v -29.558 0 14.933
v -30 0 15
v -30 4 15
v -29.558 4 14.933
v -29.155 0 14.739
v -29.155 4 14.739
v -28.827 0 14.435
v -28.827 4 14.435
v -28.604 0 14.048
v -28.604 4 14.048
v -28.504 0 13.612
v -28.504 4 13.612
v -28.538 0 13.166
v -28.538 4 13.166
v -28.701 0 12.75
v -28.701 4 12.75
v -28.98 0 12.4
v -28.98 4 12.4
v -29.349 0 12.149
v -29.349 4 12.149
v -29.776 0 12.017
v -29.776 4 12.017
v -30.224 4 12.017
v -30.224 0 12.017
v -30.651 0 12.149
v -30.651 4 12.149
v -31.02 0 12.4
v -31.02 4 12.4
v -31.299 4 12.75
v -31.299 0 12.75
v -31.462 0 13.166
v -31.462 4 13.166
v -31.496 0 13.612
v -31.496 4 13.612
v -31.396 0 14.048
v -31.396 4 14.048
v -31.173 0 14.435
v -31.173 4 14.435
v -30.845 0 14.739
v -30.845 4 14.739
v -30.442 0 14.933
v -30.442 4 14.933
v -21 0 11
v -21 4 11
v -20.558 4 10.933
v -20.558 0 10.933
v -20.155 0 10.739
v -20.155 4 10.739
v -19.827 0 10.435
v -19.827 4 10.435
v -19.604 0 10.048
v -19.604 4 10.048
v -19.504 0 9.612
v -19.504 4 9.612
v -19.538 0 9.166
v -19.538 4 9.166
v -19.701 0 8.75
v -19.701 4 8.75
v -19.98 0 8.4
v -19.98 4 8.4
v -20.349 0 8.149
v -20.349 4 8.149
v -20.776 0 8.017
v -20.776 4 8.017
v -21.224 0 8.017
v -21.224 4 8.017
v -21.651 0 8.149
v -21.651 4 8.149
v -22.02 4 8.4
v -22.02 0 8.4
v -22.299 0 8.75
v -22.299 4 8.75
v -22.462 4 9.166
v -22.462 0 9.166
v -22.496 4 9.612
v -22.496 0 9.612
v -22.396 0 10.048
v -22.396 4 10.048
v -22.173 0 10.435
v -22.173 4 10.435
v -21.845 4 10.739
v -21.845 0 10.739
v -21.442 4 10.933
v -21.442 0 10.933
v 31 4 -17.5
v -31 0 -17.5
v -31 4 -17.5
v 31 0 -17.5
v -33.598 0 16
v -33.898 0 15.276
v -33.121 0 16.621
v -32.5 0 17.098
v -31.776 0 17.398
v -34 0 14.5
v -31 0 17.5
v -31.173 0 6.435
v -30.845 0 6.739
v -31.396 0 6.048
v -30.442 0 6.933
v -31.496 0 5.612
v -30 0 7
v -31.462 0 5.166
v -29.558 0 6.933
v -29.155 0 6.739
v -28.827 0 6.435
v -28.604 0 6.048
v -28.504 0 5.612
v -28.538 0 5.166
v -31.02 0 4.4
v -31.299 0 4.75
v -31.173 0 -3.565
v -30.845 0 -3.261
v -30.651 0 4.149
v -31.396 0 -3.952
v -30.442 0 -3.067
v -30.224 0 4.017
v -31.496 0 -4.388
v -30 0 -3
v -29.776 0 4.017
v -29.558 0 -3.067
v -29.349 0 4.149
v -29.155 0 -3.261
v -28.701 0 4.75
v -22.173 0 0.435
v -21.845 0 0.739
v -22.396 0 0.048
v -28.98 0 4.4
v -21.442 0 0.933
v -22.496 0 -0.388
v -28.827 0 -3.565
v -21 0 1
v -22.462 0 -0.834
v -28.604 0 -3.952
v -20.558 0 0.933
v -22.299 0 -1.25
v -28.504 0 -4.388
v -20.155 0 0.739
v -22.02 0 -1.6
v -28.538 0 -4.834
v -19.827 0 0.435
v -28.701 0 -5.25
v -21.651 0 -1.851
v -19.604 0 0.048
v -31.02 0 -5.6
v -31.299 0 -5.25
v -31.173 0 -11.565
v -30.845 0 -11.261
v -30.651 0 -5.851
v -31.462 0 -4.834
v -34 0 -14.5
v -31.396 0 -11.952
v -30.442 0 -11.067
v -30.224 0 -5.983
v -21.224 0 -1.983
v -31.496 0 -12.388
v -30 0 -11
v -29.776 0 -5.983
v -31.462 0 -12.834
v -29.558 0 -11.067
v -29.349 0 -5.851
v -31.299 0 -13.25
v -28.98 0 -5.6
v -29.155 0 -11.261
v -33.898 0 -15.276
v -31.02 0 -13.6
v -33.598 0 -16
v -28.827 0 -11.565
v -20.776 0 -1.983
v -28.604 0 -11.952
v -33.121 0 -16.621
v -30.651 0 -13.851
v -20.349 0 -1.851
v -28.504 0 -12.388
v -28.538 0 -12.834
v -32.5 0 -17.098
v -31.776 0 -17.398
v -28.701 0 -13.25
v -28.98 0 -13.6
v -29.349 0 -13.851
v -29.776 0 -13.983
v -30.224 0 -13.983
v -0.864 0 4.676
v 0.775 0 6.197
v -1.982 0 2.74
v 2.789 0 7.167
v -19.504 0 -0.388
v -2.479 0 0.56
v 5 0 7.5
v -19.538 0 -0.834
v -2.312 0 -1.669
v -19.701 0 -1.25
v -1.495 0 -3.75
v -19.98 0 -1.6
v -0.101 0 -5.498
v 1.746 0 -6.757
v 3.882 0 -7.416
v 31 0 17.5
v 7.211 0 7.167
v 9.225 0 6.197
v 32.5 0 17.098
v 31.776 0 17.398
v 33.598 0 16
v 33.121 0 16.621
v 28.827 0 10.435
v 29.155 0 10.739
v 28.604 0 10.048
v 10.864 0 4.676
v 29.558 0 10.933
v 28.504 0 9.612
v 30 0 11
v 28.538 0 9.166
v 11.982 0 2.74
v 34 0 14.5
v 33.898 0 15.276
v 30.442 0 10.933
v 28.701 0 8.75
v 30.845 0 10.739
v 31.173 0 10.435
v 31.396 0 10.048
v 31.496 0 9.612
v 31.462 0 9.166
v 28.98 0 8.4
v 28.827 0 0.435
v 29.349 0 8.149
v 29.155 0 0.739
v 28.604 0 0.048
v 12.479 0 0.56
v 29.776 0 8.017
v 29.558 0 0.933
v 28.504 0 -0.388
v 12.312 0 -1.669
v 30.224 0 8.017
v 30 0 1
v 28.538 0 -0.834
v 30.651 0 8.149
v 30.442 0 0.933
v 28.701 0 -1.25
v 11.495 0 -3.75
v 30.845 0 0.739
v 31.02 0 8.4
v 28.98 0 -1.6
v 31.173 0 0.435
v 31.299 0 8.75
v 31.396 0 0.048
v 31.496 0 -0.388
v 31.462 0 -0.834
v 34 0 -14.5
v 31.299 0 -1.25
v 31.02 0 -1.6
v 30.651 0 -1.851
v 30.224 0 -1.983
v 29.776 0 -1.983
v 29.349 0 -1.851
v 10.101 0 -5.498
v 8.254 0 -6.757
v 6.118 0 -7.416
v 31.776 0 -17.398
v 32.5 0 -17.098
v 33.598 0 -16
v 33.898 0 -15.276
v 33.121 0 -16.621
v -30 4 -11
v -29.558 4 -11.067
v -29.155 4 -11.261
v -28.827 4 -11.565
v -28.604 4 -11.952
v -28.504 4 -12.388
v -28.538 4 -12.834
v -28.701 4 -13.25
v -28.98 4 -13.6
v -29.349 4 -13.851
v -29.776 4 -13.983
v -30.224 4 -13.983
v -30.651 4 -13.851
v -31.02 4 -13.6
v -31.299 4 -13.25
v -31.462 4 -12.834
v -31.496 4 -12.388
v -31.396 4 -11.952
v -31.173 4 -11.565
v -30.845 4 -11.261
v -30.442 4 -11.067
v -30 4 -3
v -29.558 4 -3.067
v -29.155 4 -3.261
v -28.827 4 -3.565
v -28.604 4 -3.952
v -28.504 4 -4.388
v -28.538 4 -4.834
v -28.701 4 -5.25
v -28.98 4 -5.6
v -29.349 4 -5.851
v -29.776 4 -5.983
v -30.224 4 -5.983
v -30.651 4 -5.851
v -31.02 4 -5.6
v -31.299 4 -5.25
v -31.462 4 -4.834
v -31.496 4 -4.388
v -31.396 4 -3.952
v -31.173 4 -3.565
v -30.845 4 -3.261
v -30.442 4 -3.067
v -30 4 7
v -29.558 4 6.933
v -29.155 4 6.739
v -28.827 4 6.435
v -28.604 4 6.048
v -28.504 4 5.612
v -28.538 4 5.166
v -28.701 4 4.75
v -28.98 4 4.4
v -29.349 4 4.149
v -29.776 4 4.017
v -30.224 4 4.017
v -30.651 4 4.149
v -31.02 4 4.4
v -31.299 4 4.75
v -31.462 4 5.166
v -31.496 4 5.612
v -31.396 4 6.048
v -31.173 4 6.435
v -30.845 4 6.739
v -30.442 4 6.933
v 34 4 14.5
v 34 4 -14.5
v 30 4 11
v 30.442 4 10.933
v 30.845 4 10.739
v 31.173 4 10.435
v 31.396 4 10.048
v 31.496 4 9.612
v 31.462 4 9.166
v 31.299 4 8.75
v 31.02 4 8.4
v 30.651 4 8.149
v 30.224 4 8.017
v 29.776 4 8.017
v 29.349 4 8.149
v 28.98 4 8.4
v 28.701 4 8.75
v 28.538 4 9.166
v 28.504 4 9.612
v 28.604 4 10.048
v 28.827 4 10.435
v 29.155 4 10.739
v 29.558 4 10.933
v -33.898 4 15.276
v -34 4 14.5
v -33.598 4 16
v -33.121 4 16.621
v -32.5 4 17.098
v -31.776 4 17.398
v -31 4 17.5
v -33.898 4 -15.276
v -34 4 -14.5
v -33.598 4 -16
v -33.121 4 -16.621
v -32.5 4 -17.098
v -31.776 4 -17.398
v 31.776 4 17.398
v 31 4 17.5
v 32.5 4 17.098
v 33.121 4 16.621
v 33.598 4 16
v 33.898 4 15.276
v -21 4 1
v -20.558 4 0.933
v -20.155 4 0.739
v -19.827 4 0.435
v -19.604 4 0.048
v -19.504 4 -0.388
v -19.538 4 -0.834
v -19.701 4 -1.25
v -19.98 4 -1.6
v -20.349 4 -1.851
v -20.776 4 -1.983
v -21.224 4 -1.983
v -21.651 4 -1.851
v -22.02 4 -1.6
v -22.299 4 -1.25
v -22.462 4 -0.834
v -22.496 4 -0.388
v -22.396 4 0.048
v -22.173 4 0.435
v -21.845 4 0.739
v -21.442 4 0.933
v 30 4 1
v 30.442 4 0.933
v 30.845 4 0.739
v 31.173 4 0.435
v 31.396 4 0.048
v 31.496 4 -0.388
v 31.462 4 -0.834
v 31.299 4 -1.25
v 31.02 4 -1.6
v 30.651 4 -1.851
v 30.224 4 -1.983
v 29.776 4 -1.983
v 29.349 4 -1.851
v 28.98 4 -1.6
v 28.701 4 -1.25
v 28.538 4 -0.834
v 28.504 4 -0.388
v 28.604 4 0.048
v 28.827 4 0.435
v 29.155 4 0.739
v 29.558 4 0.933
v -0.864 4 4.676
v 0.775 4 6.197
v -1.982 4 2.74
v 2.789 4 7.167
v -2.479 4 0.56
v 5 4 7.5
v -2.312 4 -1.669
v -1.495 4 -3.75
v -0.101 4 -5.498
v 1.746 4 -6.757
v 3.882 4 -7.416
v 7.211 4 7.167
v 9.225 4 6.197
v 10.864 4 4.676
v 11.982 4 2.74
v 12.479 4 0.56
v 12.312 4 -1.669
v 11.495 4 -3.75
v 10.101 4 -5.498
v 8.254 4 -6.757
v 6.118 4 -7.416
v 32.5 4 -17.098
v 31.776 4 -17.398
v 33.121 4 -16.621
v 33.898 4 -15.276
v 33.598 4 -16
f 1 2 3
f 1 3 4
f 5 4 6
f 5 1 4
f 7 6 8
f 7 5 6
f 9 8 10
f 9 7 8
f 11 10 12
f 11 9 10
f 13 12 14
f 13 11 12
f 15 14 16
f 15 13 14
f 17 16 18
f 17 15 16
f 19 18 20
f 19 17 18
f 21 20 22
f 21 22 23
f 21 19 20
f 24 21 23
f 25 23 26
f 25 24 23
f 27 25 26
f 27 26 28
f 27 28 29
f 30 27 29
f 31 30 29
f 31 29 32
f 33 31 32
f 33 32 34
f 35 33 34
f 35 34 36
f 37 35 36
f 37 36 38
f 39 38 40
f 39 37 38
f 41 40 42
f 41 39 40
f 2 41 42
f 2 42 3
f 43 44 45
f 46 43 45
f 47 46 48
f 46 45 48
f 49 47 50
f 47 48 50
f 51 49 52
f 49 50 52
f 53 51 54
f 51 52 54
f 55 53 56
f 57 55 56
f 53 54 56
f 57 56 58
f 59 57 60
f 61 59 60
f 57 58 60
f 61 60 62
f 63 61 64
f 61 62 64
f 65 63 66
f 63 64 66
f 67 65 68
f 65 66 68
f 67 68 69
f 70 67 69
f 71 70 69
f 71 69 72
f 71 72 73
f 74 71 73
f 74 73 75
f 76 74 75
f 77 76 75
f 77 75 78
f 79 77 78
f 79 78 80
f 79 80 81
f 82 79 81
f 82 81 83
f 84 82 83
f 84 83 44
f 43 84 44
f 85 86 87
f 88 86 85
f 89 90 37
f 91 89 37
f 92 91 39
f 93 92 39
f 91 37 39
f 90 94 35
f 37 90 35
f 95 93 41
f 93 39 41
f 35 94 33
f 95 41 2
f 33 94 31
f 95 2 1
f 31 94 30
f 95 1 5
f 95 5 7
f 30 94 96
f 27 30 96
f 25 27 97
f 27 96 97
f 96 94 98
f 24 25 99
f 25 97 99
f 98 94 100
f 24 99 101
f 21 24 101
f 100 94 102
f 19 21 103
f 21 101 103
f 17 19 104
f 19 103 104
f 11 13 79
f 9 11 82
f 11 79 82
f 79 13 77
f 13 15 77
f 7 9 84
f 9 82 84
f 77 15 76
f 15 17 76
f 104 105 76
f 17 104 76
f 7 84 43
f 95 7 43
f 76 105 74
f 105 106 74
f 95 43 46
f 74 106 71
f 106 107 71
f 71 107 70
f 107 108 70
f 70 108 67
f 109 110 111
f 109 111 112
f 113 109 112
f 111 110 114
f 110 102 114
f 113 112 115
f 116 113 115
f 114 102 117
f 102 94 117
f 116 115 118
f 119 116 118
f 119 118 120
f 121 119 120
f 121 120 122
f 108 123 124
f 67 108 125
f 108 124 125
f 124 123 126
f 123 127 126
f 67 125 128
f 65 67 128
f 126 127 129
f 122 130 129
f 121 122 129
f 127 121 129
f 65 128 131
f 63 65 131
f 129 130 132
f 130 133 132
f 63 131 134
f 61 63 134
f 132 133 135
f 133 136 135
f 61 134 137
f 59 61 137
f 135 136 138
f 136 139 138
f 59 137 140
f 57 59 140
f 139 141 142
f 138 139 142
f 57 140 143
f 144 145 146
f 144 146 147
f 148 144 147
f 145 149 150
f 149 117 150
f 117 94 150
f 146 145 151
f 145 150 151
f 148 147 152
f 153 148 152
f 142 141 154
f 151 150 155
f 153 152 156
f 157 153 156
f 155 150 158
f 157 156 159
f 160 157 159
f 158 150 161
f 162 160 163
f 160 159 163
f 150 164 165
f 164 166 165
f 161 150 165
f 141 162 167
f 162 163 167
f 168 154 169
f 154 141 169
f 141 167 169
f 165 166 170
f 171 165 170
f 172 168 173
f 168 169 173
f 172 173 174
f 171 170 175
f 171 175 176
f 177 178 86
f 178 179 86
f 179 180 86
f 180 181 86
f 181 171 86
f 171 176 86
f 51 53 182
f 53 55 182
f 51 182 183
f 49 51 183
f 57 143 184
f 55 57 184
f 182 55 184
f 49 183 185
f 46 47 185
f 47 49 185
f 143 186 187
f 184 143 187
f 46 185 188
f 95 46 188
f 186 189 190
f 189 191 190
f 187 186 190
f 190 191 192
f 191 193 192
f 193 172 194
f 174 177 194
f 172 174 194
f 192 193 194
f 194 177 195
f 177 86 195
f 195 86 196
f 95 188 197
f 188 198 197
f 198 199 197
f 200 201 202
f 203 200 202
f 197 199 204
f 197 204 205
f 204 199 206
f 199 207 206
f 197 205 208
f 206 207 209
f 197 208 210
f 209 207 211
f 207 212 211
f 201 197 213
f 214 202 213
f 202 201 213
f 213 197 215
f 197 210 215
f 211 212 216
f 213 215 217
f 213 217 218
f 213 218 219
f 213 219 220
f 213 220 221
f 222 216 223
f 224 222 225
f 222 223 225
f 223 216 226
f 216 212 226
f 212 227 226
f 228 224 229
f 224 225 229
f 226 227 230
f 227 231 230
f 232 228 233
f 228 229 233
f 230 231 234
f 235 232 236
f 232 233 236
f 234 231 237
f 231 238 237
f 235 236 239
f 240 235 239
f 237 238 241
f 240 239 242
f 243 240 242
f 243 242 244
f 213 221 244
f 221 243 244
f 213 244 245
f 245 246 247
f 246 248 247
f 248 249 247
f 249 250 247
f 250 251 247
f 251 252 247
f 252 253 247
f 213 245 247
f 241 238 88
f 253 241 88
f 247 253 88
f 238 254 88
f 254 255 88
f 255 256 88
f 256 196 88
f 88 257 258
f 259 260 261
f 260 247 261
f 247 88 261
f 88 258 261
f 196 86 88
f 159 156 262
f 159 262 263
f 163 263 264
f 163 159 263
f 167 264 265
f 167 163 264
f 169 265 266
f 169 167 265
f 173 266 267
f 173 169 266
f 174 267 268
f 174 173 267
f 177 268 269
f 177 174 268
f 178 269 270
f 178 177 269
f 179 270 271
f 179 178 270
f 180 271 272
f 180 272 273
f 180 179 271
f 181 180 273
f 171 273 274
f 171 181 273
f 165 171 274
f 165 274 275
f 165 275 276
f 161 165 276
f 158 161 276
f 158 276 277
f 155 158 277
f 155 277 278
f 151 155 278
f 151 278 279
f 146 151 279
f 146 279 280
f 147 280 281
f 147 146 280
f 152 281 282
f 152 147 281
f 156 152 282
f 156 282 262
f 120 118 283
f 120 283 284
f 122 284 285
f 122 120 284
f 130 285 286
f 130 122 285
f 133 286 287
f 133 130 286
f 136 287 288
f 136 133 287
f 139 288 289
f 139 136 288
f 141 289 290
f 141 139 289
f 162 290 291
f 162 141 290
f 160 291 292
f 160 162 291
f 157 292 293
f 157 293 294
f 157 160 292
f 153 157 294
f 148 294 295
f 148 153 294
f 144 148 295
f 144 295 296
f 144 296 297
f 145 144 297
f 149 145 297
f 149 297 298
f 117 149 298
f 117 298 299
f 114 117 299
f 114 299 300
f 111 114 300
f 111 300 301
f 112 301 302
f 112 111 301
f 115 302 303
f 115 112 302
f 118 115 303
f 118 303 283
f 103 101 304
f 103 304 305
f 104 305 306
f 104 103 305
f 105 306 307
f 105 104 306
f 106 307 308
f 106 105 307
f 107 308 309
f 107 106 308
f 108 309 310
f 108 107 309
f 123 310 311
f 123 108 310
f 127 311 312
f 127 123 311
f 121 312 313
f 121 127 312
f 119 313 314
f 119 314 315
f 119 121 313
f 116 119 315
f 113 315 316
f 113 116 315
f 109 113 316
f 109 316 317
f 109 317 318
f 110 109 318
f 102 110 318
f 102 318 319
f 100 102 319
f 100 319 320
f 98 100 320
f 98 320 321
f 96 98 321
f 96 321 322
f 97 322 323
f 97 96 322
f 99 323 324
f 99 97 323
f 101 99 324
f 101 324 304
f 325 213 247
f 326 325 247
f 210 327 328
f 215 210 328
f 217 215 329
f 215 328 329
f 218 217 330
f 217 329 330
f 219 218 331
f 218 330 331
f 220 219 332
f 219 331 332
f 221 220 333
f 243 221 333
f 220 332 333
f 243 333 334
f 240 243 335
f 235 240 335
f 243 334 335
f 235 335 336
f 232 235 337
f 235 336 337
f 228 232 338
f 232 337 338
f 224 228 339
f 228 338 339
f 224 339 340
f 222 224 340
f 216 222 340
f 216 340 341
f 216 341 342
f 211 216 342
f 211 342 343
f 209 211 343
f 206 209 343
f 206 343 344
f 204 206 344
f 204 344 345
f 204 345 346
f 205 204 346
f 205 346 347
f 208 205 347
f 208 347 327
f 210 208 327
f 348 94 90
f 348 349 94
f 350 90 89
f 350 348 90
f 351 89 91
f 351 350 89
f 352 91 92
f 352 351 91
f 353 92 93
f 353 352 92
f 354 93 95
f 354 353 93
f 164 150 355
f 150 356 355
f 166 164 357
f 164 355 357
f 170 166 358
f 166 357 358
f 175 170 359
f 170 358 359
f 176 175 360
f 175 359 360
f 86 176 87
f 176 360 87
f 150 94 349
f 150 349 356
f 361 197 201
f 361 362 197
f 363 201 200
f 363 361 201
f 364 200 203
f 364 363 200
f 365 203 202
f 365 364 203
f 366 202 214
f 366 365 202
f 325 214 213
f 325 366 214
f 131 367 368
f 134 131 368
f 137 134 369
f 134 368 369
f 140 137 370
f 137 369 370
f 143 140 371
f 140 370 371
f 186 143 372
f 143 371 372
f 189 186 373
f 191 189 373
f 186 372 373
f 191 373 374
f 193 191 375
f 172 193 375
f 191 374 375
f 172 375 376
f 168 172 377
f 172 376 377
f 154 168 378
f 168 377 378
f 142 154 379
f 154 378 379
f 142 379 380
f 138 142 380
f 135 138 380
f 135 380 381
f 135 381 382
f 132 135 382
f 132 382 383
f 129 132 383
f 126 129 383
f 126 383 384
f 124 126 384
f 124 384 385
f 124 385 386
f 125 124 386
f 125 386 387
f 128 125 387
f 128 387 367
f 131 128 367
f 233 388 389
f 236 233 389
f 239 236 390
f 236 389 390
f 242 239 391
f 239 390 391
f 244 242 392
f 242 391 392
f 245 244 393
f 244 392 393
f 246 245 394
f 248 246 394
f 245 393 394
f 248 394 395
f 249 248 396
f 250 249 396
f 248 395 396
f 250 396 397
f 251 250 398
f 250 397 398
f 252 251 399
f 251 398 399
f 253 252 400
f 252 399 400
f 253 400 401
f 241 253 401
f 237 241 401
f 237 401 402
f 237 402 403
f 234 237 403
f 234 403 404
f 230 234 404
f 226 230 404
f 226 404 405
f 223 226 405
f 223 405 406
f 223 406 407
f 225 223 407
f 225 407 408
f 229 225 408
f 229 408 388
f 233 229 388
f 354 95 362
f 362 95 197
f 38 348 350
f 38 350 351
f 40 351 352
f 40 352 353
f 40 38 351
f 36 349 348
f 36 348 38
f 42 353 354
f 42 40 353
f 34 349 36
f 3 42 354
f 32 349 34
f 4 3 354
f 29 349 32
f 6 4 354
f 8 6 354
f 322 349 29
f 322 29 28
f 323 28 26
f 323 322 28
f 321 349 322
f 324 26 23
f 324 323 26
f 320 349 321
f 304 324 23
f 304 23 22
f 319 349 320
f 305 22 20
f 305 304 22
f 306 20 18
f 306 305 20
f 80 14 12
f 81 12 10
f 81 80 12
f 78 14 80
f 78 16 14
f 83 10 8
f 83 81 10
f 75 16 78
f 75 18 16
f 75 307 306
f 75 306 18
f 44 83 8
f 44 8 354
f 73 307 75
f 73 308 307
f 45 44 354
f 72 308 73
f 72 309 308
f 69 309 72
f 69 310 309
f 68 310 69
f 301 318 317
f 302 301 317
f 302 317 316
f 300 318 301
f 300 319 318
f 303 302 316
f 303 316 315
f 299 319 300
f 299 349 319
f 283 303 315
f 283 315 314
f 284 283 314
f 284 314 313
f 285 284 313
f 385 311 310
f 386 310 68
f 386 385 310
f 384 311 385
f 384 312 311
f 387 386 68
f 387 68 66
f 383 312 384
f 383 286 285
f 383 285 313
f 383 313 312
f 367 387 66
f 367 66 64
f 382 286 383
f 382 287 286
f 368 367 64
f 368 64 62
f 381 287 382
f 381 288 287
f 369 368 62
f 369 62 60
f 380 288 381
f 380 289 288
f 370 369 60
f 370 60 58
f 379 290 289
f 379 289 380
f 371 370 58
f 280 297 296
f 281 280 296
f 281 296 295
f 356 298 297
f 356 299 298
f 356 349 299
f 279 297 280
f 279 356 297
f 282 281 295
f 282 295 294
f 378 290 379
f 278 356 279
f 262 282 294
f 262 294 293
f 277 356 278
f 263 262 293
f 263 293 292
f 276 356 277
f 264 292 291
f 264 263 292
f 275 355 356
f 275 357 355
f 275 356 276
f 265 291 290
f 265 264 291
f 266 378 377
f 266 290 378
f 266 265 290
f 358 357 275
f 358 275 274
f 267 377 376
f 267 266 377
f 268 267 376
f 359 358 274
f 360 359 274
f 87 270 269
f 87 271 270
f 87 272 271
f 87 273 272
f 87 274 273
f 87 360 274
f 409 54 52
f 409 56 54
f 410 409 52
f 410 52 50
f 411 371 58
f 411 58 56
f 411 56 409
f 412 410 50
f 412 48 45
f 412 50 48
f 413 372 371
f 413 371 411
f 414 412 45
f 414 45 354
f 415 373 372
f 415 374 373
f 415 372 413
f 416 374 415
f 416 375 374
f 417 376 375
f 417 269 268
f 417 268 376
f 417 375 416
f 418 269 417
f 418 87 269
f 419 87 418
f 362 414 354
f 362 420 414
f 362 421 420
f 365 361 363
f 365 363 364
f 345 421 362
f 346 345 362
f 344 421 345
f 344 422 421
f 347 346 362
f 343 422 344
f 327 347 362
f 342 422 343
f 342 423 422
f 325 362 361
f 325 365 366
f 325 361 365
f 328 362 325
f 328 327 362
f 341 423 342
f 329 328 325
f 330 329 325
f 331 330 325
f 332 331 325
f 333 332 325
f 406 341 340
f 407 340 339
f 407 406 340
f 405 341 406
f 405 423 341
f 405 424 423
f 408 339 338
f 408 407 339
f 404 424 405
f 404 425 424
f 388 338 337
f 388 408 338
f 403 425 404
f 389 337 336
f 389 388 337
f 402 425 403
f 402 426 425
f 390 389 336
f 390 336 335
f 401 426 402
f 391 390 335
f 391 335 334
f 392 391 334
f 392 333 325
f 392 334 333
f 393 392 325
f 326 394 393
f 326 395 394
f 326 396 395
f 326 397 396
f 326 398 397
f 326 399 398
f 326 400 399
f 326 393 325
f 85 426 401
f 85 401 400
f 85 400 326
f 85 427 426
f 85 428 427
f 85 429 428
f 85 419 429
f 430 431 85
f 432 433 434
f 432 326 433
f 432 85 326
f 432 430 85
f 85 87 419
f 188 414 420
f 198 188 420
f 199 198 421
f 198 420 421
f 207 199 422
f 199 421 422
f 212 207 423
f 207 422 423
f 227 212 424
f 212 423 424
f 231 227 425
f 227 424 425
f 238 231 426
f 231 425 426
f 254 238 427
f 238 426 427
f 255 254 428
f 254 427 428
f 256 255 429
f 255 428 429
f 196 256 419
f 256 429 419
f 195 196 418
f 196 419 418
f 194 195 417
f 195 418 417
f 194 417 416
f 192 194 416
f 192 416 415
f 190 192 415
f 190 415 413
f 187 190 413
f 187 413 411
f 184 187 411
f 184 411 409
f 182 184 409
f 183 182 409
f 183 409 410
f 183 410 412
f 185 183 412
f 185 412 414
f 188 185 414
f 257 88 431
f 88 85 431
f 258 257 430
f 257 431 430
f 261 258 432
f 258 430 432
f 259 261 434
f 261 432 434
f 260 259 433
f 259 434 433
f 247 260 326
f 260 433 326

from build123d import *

# Parameters (mm, degrees)
SKETCH_1_W          = 68
SKETCH_1_H          = 35
SKETCH_1_R          = 1.5
EXTRUDE_1_DEPTH     = 4
FILLET_1_R          = 3
SKETCH_2_R          = 1.5
SKETCH_2_R_2        = 7.5
CUT_EXTRUDE_1_DEPTH = 10


with BuildPart() as part:
    # 草图1 → 凸台-拉伸1 (new body)
    with BuildSketch(Plane(origin=(0, 0, 0), x_dir=(1, 0, 0), z_dir=(0, 1, 0))):
        Rectangle(SKETCH_1_W, SKETCH_1_H)
        with Locations(Location((-30, 12.5, 0), (0, 0, 270))):
            Circle(SKETCH_1_R, mode=Mode.SUBTRACT)
        with Locations(Location((-30, 4.5, 0), (0, 0, 270))):
            Circle(SKETCH_1_R, mode=Mode.SUBTRACT)
        with Locations(Location((-30, -5.5, 0), (0, 0, 270))):
            Circle(SKETCH_1_R, mode=Mode.SUBTRACT)
        with Locations(Location((-30, -13.5, 0), (0, 0, 270))):
            Circle(SKETCH_1_R, mode=Mode.SUBTRACT)
    extrude(amount=EXTRUDE_1_DEPTH)

    # 圆角1
    fillet_1_edges = [part.edges().sort_by_distance(p)[0] for p in [
        (34, 2, 17.5),
        (-34, 2, 17.5),
        (-34, 2, -17.5),
        (34, 2, -17.5),
    ]]
    fillet(fillet_1_edges, radius=FILLET_1_R)

    # 草图2 → 切除-拉伸1 (cut)
    with BuildSketch(Plane(origin=(0, 4, 0), x_dir=(1, 0, 0), z_dir=(0, 1, 0))):
        with Locations(Location((-21, 0.5, 0), (0, 0, 270))):
            Circle(SKETCH_2_R)
        with Locations(Location((30, 0.5, 0), (0, 0, 270))):
            Circle(SKETCH_2_R)
        with Locations(Location((-21, -9.5, 0), (0, 0, 270))):
            Circle(SKETCH_2_R)
        with Locations(Location((30, -9.5, 0), (0, 0, 270))):
            Circle(SKETCH_2_R)
        with Locations(Location((5, 0, 0), (0, 0, 270))):
            Circle(SKETCH_2_R_2)
    extrude(amount=-CUT_EXTRUDE_1_DEPTH, mode=Mode.SUBTRACT)


solid = part.part
